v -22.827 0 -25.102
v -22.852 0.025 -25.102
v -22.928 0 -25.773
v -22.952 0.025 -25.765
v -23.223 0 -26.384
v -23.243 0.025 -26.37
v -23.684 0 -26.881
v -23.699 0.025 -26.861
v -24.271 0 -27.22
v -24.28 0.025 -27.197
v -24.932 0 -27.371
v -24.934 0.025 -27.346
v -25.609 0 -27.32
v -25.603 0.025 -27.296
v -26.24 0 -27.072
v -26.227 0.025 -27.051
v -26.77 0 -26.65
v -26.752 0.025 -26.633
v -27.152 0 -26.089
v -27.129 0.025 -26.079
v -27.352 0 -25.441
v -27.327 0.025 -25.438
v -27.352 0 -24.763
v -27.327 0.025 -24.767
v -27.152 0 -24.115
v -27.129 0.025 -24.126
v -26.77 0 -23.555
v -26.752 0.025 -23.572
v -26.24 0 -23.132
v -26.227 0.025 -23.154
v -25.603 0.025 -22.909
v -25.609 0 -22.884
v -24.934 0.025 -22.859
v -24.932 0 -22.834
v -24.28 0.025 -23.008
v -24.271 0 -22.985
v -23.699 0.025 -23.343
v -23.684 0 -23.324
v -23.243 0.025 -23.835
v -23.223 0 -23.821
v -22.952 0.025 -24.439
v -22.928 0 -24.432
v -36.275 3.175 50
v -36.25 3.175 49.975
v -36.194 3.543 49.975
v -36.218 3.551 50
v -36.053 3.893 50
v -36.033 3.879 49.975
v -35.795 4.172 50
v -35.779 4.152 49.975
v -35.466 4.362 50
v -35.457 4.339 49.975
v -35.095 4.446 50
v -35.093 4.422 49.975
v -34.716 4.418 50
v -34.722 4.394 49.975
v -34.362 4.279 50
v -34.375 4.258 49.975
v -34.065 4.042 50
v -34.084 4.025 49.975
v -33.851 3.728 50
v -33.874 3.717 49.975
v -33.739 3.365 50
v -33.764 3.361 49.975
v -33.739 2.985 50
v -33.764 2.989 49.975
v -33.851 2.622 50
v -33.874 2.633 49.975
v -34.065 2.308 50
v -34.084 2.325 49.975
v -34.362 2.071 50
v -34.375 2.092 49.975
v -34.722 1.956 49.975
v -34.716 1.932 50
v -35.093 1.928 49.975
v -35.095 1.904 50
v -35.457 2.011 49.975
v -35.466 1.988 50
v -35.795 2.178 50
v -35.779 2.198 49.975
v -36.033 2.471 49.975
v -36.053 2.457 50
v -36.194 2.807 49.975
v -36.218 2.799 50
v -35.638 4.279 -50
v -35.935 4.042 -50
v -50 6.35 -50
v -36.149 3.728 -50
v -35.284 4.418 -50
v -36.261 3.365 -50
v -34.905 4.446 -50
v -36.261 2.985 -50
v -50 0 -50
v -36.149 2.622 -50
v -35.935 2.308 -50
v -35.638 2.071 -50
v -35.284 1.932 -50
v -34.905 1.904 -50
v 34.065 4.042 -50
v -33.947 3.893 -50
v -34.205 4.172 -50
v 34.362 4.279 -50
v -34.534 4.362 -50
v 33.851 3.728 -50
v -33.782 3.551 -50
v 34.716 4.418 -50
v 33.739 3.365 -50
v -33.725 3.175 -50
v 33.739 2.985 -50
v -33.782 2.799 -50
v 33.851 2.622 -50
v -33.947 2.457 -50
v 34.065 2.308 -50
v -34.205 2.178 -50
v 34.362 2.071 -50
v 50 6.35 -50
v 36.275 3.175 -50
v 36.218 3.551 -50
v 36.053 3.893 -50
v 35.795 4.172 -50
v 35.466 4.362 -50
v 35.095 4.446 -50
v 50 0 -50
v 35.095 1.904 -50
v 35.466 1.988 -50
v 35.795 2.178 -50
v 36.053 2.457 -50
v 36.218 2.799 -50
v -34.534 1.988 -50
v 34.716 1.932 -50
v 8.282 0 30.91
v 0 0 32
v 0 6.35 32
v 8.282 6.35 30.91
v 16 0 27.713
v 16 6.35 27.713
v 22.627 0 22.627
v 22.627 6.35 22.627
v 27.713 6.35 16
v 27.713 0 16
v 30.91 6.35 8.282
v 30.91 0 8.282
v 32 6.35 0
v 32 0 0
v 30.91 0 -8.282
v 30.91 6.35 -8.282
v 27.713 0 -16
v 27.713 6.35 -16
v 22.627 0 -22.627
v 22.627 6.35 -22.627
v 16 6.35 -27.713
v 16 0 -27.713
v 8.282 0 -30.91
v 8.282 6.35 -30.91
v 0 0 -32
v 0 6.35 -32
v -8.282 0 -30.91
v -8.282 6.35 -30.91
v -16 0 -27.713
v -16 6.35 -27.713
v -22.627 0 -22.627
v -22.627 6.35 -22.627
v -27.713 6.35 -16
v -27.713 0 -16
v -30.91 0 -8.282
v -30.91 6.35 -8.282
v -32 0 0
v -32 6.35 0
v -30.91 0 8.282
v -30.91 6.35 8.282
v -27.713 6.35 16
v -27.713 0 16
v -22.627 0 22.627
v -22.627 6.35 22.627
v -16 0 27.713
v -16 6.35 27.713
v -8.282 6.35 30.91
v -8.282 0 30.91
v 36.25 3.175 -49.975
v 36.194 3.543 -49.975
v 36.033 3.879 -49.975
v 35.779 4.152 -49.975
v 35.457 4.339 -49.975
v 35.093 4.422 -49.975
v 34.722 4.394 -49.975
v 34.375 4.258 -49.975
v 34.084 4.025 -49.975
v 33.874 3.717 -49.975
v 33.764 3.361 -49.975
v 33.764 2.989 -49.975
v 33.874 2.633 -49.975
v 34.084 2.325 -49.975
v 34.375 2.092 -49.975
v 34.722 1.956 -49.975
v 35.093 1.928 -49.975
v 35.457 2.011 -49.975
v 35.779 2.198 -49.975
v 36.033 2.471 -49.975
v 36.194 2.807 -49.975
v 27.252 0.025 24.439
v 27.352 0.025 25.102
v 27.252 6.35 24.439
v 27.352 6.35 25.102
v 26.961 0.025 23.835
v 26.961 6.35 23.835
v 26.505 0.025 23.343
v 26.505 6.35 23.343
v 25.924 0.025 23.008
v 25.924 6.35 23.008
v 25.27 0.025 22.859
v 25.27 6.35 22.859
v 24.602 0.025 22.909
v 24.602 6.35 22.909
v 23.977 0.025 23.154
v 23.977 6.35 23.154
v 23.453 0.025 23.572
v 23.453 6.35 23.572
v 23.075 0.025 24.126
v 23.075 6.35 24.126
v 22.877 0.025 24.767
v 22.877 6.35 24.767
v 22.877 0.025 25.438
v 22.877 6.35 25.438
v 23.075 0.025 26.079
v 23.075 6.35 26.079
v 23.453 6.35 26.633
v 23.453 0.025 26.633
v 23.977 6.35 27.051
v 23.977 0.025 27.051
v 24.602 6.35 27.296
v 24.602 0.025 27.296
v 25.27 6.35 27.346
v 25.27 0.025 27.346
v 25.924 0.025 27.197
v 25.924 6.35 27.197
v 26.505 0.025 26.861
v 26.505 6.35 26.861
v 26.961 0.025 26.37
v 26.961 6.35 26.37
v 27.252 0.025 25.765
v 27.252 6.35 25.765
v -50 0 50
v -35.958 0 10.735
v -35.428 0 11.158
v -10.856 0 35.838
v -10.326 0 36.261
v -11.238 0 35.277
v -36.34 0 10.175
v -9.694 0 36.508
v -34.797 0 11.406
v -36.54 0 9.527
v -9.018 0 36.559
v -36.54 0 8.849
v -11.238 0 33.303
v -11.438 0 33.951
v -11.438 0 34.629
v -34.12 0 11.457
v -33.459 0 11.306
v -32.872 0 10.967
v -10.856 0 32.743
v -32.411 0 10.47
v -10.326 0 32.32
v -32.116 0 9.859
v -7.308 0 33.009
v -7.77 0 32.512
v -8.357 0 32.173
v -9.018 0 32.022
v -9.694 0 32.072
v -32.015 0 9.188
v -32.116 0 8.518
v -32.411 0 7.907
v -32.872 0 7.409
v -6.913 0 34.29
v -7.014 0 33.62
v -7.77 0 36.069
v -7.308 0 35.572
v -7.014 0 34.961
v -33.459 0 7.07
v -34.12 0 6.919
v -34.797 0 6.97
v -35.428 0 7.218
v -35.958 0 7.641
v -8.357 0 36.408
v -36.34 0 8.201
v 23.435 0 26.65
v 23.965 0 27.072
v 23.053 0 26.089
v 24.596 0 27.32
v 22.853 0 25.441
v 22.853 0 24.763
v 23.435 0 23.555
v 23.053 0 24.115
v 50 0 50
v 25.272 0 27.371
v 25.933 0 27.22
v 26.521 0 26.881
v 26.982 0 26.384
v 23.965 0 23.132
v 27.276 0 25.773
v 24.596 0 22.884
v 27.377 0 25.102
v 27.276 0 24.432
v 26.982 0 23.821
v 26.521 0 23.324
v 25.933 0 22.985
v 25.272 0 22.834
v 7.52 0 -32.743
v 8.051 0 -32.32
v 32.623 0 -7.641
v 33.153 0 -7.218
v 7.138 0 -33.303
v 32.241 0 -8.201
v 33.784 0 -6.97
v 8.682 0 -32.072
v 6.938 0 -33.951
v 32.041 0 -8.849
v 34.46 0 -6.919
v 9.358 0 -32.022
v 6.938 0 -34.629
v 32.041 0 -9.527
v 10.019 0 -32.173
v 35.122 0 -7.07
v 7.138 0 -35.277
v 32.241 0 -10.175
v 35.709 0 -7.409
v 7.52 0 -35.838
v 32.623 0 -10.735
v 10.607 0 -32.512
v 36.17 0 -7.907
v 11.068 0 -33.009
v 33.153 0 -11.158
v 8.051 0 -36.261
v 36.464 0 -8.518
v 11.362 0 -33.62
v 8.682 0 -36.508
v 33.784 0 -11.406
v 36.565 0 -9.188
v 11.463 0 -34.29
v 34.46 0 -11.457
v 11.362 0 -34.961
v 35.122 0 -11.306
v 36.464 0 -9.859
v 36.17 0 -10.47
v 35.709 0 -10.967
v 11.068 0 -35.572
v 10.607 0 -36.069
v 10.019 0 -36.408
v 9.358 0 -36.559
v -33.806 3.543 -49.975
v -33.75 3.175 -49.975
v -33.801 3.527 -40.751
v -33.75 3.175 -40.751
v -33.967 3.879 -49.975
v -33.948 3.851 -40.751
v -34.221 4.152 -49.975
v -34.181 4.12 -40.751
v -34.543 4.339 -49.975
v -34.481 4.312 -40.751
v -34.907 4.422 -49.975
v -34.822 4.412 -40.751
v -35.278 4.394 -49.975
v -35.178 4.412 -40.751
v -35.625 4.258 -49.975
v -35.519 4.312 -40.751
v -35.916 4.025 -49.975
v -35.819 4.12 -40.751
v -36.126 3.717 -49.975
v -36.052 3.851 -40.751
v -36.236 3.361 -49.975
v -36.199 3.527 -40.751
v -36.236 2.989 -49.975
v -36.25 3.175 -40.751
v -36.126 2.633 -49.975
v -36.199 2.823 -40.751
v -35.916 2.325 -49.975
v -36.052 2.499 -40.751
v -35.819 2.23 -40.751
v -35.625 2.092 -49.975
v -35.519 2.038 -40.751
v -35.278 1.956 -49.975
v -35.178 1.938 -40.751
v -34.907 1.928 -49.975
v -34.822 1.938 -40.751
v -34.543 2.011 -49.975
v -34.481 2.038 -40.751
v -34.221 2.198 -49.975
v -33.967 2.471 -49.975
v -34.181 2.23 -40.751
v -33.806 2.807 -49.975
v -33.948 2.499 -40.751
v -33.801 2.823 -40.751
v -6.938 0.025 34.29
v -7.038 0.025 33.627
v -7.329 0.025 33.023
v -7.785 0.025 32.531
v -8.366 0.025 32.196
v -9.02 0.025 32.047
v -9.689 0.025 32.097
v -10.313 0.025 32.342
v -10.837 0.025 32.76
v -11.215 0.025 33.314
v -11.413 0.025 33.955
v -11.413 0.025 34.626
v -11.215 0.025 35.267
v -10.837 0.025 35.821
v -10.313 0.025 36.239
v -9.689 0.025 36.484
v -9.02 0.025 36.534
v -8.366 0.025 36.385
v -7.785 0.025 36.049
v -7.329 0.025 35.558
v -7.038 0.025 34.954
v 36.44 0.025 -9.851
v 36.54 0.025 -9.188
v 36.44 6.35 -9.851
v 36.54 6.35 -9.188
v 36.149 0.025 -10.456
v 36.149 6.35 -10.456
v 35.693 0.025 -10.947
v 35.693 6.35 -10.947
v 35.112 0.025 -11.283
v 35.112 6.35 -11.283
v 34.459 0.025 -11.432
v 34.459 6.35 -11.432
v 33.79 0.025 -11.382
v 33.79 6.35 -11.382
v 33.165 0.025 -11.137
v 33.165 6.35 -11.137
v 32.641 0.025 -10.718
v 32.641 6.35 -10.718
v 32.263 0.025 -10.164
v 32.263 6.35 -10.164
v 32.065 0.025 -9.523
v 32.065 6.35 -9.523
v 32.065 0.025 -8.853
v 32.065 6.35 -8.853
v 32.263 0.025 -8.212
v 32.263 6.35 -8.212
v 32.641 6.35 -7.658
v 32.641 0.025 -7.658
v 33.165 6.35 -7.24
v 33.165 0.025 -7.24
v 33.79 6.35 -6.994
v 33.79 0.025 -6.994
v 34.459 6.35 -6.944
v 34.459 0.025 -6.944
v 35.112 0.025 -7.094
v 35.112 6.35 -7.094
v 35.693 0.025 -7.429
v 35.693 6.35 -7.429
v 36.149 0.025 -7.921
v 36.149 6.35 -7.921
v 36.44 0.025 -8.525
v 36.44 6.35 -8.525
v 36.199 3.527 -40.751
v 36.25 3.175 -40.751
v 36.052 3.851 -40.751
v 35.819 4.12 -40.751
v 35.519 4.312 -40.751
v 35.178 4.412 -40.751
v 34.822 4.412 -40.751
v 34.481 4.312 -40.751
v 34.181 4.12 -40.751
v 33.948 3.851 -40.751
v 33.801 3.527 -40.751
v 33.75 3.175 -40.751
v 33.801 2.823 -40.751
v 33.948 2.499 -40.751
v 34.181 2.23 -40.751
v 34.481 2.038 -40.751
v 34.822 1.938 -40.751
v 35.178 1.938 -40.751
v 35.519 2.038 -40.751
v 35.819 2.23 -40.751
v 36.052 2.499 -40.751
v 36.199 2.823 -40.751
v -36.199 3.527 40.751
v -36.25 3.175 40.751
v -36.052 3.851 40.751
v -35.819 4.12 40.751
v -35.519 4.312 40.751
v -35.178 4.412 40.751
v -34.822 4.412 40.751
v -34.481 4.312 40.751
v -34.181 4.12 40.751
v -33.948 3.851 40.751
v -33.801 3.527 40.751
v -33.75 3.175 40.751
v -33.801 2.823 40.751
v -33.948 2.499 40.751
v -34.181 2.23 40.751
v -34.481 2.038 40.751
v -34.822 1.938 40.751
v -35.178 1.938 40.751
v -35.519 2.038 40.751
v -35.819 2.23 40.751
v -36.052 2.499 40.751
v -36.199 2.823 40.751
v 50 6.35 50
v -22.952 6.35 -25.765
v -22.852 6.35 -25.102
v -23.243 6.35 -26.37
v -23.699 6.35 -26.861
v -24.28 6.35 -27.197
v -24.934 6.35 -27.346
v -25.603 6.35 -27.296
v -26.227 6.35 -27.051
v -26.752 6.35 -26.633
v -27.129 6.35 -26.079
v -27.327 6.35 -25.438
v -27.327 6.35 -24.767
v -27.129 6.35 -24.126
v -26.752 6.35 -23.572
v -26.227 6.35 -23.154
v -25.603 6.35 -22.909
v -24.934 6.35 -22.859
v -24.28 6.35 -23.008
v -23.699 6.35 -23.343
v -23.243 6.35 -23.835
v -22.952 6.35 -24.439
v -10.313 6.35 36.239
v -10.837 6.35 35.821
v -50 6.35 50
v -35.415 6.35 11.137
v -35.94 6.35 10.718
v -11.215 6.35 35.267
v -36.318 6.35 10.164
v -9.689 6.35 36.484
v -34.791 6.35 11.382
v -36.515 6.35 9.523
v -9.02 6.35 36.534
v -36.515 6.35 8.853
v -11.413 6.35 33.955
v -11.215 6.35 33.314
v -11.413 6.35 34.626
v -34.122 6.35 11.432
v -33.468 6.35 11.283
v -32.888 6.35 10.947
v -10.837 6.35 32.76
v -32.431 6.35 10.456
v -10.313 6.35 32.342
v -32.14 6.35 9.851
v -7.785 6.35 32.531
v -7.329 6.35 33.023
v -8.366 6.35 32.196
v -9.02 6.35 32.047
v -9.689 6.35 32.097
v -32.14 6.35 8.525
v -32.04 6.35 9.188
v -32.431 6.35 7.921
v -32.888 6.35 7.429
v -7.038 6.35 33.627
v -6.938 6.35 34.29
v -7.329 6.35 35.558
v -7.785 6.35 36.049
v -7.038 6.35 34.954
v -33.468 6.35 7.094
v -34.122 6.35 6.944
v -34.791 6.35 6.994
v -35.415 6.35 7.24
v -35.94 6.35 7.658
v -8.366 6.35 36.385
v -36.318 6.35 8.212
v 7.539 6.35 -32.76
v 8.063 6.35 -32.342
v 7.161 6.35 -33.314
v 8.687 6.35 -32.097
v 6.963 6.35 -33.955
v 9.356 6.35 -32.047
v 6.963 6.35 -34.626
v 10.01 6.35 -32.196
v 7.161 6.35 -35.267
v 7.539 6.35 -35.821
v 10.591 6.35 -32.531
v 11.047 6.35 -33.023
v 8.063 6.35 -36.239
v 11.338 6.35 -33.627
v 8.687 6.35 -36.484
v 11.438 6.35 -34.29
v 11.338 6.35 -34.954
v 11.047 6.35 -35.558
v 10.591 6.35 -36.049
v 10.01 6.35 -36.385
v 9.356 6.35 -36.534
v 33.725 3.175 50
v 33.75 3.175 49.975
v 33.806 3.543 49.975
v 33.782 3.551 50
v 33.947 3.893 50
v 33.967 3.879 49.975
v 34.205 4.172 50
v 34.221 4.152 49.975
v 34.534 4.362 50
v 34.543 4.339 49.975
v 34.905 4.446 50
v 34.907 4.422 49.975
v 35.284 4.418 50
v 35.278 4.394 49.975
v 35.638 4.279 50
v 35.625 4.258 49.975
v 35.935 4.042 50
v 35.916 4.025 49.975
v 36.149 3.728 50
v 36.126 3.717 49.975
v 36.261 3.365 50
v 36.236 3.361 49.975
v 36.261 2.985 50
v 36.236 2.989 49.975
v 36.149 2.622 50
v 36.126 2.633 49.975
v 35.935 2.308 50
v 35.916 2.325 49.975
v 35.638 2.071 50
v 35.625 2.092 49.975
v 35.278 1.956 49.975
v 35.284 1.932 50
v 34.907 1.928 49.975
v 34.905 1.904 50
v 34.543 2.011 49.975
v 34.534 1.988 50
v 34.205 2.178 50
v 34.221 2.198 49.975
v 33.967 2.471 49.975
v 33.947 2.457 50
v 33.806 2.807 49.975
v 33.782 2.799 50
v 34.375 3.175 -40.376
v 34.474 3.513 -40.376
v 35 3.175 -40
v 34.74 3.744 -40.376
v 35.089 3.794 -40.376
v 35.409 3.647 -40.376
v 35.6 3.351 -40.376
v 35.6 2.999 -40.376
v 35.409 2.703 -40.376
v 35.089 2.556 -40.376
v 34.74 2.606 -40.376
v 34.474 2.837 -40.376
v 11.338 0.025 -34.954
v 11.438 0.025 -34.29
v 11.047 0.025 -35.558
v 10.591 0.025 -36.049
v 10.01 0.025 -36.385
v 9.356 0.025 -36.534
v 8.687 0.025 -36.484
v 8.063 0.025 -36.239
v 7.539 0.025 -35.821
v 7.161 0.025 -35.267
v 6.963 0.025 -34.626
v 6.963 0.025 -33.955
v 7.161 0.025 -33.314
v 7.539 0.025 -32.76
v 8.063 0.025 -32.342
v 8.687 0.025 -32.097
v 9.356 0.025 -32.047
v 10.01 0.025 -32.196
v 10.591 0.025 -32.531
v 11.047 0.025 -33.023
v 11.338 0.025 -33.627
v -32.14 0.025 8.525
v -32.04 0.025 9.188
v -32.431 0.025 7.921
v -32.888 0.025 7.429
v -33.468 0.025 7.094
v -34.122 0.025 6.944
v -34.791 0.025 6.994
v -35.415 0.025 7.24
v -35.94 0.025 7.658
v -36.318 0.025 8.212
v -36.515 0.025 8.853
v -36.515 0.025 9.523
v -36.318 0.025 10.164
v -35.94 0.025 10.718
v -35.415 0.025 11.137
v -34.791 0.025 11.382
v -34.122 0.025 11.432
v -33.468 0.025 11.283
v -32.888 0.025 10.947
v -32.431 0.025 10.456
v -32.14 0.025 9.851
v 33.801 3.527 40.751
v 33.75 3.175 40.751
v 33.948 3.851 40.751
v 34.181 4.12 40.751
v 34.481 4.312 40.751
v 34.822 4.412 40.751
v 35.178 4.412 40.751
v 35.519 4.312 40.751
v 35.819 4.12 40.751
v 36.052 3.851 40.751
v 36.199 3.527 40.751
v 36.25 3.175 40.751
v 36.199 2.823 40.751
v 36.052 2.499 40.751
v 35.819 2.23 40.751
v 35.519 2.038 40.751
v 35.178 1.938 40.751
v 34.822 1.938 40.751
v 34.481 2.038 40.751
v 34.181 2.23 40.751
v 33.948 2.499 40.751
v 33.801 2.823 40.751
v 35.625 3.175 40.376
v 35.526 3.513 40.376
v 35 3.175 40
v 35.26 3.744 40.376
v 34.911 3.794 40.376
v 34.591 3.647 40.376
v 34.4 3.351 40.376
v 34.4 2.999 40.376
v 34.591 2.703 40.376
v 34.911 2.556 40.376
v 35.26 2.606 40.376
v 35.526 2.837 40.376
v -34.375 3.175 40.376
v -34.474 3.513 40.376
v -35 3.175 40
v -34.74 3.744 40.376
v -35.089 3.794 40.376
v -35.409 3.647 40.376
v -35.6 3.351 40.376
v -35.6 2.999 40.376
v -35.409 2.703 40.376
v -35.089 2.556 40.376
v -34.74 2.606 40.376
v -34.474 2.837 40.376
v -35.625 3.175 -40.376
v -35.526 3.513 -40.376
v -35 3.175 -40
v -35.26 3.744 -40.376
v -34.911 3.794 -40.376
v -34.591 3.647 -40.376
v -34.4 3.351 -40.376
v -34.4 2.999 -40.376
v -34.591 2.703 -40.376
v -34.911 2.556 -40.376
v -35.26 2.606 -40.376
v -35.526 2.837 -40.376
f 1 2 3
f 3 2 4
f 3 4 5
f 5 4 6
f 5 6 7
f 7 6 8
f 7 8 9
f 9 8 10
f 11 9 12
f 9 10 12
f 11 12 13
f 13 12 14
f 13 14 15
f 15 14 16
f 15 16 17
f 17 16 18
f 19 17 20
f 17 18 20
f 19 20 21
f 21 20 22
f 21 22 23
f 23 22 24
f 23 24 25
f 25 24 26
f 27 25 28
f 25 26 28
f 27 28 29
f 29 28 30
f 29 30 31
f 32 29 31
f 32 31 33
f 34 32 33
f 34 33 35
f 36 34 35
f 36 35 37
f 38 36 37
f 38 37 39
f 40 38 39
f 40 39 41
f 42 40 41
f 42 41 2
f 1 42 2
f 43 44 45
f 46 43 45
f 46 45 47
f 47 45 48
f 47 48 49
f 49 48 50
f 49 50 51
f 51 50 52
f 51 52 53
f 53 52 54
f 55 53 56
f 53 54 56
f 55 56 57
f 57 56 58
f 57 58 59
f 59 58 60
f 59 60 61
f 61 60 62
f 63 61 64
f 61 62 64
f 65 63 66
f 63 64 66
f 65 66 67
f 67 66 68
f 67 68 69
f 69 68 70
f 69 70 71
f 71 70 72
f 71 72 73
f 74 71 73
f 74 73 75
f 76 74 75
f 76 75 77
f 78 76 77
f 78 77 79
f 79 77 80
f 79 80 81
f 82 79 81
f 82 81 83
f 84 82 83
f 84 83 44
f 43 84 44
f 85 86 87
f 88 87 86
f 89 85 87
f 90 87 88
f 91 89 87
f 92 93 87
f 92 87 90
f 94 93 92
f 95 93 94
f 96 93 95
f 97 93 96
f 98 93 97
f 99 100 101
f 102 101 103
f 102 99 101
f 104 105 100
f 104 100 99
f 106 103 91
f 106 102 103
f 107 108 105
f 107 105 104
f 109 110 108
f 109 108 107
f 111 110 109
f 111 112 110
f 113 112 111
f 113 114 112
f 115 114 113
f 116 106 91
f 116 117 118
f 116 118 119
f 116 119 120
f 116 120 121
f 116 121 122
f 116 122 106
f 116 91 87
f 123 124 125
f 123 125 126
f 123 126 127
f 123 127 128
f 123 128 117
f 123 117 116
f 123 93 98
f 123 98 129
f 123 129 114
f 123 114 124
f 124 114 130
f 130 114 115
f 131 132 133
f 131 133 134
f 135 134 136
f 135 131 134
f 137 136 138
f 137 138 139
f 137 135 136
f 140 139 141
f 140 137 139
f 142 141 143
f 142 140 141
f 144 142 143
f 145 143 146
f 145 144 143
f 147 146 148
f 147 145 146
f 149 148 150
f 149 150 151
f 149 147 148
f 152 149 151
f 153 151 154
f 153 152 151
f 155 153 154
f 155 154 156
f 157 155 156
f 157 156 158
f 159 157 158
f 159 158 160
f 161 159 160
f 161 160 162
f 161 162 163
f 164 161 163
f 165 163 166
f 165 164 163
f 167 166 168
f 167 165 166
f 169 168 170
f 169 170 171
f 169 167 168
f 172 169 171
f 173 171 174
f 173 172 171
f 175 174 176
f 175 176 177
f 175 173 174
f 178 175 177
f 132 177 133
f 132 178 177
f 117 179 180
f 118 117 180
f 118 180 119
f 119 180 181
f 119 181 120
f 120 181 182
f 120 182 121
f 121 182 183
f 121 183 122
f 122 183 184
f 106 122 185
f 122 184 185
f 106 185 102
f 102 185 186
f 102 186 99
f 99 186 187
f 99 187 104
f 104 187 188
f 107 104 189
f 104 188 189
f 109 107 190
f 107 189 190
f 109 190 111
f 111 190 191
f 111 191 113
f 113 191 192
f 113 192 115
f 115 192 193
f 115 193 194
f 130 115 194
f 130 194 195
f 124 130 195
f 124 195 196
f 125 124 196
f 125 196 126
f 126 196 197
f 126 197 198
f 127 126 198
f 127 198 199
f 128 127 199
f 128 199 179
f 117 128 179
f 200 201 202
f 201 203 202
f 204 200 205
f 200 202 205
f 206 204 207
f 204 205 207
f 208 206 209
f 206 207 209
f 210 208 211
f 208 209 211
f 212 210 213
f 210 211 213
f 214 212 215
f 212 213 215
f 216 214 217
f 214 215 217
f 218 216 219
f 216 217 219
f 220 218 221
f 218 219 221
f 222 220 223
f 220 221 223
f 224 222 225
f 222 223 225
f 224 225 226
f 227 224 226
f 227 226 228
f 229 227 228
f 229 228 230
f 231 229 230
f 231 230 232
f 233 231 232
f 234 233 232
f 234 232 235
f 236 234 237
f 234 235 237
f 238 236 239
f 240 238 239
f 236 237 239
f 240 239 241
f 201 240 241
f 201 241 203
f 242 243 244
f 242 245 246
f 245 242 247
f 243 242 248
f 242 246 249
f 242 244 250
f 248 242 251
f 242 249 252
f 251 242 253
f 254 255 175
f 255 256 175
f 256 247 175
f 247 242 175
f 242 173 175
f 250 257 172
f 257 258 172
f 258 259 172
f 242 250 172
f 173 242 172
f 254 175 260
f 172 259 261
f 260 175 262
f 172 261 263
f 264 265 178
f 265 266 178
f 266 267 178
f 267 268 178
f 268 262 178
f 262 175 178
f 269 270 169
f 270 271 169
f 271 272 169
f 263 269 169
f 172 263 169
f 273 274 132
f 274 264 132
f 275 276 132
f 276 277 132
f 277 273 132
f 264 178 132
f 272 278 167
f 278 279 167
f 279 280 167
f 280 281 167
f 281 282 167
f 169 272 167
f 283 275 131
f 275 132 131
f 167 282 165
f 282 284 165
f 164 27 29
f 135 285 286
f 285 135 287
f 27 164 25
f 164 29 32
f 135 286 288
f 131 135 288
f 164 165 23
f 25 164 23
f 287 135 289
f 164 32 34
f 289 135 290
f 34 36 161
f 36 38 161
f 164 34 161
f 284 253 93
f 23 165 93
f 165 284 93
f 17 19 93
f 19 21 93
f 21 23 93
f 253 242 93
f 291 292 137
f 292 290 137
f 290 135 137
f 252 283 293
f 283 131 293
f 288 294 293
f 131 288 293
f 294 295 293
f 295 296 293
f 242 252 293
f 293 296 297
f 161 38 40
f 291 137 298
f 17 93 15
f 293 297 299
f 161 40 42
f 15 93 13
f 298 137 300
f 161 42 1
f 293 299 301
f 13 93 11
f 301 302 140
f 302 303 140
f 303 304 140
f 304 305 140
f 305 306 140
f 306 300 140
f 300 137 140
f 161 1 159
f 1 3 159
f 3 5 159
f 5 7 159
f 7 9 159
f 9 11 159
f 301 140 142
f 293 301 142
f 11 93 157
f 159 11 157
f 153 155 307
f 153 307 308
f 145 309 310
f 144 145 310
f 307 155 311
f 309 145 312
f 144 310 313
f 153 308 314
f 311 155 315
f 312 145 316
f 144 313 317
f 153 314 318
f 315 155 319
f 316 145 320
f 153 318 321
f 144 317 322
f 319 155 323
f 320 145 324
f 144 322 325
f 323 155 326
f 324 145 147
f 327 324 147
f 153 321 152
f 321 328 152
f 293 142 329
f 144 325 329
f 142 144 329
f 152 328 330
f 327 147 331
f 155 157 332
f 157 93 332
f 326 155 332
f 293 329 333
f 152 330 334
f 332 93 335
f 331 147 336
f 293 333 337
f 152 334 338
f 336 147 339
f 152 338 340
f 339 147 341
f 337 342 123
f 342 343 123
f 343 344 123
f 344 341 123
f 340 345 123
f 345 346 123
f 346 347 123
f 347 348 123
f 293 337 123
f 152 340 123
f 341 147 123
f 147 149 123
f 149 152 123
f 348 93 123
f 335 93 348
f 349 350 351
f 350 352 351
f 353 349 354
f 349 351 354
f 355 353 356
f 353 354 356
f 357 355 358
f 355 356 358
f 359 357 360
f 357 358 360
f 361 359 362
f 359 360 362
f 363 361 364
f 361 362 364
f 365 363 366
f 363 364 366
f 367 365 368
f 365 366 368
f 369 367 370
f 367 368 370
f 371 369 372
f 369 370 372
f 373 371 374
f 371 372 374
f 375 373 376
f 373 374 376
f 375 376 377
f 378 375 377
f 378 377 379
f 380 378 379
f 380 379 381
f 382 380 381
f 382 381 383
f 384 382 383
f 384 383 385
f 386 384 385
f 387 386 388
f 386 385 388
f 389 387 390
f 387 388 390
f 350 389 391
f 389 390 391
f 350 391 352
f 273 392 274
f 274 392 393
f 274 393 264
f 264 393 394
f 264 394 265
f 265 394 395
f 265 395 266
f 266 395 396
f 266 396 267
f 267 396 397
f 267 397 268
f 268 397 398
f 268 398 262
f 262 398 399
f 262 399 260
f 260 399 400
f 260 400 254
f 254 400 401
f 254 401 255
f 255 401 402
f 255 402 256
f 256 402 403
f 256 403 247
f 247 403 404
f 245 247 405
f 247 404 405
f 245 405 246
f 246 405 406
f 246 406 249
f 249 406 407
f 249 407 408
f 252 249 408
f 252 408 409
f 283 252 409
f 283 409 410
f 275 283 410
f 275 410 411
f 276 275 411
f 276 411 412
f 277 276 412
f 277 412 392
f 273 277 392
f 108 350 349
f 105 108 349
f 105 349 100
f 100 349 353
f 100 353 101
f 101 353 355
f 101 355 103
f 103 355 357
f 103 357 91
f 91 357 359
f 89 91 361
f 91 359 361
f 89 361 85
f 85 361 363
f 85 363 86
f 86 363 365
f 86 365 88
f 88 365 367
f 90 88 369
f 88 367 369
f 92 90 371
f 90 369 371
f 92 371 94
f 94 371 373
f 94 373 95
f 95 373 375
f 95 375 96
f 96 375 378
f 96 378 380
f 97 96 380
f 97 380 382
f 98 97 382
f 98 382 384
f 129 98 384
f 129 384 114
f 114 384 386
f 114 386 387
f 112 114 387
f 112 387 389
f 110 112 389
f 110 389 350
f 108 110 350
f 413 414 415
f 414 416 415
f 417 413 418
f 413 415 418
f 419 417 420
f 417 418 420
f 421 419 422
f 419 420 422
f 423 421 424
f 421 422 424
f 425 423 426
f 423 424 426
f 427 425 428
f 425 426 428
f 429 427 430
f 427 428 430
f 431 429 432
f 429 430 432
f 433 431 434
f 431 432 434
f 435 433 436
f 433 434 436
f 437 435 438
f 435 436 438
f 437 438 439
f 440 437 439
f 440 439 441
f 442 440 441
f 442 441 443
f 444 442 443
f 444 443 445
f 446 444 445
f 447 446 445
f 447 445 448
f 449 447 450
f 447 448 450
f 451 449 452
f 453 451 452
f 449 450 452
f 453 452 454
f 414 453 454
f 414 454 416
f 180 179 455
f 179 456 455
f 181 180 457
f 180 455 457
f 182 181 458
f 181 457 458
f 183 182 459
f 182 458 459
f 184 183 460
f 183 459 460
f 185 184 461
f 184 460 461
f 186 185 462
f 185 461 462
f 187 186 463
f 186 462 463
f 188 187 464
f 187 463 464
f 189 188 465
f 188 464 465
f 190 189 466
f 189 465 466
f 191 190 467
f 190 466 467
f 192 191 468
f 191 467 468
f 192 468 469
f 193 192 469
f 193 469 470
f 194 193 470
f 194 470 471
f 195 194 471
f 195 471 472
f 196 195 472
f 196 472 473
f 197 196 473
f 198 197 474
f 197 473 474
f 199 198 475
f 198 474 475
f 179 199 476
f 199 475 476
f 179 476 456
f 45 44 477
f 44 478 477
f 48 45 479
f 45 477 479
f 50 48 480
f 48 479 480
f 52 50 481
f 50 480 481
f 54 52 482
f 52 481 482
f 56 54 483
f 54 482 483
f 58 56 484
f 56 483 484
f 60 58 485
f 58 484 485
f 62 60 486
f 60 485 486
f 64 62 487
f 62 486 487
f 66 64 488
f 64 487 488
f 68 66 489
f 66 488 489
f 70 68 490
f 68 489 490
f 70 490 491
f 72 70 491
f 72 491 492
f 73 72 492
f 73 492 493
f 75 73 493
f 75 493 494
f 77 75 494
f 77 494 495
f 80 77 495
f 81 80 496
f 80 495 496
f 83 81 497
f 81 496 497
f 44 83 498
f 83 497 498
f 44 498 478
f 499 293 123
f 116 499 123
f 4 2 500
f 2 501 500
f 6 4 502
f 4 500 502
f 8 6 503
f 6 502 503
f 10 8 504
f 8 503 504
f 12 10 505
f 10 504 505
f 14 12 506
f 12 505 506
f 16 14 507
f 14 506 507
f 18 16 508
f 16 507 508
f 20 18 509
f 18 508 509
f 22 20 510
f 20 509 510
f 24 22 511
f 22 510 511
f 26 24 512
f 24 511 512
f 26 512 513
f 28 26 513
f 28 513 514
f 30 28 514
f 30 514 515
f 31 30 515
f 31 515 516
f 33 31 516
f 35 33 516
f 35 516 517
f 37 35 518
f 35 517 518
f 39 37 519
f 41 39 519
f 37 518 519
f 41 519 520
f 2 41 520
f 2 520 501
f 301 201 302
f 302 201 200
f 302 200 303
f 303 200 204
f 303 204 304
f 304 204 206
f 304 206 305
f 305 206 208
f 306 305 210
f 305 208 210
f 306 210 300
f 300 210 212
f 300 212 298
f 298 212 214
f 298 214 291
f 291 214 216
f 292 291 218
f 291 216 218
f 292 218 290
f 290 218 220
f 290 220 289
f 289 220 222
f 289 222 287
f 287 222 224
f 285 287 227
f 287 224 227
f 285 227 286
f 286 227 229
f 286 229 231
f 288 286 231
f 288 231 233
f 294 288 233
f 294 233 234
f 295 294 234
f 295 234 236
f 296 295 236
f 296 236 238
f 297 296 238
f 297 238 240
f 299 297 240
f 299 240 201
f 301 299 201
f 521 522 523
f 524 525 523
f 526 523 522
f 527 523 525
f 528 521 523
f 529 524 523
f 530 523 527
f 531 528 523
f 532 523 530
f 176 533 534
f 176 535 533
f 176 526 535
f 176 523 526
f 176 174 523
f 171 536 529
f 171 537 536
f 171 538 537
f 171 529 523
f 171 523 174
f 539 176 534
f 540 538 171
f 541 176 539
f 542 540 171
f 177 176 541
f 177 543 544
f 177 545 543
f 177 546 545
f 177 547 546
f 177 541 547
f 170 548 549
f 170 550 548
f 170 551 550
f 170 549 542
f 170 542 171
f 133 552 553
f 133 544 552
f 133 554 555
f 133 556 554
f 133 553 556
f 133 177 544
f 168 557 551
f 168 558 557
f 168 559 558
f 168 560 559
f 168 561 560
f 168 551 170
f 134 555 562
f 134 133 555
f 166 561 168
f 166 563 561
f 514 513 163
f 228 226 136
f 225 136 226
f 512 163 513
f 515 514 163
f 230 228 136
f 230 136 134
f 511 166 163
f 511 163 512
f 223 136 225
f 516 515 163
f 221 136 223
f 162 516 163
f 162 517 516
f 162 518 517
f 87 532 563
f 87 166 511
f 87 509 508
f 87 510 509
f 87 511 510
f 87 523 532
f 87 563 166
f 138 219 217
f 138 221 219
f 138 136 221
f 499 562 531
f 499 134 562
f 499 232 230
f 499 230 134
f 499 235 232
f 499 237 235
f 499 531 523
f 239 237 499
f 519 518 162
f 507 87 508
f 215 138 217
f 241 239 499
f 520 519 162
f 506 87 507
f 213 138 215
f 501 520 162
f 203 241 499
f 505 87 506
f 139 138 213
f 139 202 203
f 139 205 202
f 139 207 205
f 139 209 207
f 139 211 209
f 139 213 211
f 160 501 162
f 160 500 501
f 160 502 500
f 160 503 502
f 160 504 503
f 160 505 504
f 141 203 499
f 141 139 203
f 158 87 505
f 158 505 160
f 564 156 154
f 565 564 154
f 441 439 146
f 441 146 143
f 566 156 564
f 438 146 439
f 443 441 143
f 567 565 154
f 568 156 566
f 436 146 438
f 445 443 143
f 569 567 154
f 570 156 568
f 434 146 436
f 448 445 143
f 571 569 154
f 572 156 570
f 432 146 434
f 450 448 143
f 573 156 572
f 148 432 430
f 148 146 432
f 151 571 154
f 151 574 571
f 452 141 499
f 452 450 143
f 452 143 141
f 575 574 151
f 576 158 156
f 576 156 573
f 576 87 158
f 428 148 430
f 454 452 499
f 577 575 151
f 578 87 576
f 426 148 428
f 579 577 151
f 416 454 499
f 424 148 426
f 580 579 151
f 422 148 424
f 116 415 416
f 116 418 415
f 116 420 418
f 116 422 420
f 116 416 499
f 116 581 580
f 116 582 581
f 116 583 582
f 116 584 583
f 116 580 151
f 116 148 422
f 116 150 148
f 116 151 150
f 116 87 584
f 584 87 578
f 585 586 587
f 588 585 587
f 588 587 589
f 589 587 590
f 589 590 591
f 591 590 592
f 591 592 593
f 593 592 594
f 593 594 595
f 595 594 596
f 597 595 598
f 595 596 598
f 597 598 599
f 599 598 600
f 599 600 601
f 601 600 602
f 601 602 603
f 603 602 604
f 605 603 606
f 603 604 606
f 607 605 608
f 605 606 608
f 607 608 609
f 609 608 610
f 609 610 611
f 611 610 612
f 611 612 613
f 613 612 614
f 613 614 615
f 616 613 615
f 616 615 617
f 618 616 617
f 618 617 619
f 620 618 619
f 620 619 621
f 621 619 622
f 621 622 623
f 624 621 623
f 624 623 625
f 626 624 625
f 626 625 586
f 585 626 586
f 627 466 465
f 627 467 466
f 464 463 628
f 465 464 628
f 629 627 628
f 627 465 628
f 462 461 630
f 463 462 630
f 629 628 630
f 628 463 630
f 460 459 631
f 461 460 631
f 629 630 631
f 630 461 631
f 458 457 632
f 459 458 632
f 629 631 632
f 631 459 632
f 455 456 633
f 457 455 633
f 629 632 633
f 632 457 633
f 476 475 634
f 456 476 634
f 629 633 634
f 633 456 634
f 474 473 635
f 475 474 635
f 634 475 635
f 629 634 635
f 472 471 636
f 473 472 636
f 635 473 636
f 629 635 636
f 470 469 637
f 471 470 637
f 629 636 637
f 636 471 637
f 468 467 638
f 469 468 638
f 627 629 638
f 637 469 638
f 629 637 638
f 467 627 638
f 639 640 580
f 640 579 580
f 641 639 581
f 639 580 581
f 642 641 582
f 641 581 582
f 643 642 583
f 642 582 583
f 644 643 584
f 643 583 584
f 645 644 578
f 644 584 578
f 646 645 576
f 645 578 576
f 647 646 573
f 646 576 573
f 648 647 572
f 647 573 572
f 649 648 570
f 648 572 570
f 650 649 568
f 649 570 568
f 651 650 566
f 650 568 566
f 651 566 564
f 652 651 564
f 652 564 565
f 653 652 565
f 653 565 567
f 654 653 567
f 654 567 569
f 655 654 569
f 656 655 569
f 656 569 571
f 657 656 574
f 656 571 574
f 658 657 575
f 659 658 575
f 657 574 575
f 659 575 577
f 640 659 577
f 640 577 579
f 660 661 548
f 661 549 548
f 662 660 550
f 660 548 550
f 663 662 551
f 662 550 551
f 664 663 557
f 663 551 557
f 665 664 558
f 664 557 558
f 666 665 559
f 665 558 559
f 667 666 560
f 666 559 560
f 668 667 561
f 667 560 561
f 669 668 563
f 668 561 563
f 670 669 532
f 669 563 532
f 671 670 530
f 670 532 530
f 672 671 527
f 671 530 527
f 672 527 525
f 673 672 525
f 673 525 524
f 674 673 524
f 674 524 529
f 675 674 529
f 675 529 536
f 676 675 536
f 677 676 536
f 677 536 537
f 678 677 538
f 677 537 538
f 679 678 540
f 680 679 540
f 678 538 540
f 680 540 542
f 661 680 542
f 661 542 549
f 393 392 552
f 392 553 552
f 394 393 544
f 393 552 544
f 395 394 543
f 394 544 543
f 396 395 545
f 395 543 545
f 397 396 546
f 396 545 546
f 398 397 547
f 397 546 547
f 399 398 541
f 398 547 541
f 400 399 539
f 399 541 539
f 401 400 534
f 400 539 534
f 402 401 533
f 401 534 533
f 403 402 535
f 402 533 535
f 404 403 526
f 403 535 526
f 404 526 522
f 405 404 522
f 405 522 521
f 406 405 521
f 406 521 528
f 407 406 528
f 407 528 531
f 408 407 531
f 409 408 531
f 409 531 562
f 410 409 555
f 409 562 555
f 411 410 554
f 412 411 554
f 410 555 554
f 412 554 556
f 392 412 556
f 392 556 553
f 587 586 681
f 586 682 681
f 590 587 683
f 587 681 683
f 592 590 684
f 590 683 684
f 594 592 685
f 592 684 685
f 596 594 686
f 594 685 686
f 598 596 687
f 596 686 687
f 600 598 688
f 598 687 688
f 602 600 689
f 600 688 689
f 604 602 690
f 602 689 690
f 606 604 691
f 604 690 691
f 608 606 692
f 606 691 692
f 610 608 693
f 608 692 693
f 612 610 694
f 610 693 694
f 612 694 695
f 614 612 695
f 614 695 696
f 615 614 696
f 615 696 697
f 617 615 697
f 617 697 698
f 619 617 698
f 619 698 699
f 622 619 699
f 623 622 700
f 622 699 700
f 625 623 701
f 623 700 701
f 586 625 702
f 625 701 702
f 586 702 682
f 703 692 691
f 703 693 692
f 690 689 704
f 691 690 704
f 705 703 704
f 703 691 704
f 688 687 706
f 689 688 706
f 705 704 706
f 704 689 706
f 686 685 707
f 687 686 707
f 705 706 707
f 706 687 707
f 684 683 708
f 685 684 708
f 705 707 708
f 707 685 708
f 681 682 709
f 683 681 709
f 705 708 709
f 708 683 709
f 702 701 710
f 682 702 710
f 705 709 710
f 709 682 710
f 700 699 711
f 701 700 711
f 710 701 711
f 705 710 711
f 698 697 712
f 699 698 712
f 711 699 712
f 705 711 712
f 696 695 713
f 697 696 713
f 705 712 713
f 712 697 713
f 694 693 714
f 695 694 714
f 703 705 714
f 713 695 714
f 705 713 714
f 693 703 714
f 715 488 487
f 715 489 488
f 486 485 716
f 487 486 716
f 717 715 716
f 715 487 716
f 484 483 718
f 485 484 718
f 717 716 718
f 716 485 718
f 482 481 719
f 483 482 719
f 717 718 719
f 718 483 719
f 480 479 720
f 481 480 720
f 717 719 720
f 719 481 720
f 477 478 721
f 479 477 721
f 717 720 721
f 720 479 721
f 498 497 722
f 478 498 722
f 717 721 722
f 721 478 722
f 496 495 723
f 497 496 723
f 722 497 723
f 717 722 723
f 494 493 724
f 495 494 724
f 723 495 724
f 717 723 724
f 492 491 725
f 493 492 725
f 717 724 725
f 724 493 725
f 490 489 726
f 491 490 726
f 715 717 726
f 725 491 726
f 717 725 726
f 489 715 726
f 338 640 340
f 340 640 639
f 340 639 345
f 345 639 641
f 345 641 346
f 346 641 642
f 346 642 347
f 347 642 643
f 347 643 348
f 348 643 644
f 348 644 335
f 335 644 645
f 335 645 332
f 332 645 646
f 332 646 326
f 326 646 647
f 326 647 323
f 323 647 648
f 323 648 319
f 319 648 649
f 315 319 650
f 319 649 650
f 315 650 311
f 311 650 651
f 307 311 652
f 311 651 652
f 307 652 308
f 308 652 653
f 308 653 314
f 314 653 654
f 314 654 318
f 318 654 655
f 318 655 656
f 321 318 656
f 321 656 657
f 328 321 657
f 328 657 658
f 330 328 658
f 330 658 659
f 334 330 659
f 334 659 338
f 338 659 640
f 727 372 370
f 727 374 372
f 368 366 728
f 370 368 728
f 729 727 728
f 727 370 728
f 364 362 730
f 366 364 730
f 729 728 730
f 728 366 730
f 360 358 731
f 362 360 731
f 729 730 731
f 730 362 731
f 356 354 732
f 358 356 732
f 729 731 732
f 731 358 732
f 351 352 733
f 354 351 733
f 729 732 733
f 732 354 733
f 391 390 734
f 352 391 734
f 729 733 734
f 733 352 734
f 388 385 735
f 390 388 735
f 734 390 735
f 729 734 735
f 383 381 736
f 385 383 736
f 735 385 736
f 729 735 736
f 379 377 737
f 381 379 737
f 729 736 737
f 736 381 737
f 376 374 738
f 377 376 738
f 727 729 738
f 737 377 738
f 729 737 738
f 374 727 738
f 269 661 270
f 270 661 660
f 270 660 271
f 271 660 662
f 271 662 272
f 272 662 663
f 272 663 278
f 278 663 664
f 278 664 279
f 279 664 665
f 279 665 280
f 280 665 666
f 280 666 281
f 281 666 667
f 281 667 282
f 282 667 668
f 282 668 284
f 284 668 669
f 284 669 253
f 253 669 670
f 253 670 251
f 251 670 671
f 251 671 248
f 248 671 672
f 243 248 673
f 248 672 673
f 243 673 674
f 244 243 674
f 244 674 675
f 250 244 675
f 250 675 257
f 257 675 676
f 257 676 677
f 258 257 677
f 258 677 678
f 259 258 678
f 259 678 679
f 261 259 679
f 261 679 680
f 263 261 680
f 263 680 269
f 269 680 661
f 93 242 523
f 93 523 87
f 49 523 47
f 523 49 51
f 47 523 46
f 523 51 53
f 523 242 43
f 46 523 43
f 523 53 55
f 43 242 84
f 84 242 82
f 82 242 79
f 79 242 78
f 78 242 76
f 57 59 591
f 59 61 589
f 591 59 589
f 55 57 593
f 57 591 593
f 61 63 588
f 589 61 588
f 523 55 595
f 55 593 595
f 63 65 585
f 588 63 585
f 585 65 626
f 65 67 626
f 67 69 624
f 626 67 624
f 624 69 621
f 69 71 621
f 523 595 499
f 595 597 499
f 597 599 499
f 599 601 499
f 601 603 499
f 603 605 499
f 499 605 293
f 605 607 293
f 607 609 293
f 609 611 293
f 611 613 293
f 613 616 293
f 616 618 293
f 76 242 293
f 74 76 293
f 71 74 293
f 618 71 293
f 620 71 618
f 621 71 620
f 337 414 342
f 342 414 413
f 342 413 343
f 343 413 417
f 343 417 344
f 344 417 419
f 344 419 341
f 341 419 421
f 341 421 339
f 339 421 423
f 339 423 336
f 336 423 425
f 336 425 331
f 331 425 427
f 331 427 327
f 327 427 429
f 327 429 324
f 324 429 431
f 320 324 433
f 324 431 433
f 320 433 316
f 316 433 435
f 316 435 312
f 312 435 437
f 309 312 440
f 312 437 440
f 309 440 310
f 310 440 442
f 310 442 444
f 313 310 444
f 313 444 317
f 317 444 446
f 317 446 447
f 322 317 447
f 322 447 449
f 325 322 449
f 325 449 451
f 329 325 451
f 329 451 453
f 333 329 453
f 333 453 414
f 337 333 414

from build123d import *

# Parameters (mm, degrees)
SKETCH1_W                             = 100
SKETCH1_H                             = 100
SKETCH1_R                             = 32
BOSS_EXTRUDE3_DEPTH                   = 6.35
M4_CLEARANCE_HOLE2_D                  = 4.5
M4_CLEARANCE_HOLE2_CSINK_D            = 4.55
M4_CLEARANCE_HOLE2_CSINK_ANGLE        = 90
TAP_DRILL_FOR_M3X0_5_TAP2_D           = 2.5
TAP_DRILL_FOR_M3X0_5_TAP2_DEPTH       = 9.248924226
TAP_DRILL_FOR_M3X0_5_TAP2_CSINK_D     = 2.55
TAP_DRILL_FOR_M3X0_5_TAP2_CSINK_ANGLE = 90
TAP_DRILL_FOR_M3X0_5_TAP2_TIP         = 0.751075774
TAP_DRILL_FOR_M3X0_5_TAP3_D           = 2.5
TAP_DRILL_FOR_M3X0_5_TAP3_DEPTH       = 9.248924226
TAP_DRILL_FOR_M3X0_5_TAP3_CSINK_D     = 2.55
TAP_DRILL_FOR_M3X0_5_TAP3_CSINK_ANGLE = 90
TAP_DRILL_FOR_M3X0_5_TAP3_TIP         = 0.751075774


with BuildPart() as part:
    # Sketch1 → Boss-Extrude3 (new body)
    with BuildSketch(Plane(origin=(0, 0, 0), x_dir=(1, 0, 0), z_dir=(0, 1, 0))):
        Rectangle(SKETCH1_W, SKETCH1_H)
        with Locations(Location((0, 0, 0), (0, 0, 270))):
            Circle(SKETCH1_R, mode=Mode.SUBTRACT)
    extrude(amount=BOSS_EXTRUDE3_DEPTH)

    # M4 Clearance Hole2 (through all)
    with Locations(Plane(origin=(0, 0, 0), x_dir=(-1, 0, 0), z_dir=(0, -1, 0))):
        with Locations((-9.188076101, 34.290366833), (25.102290732, 25.102290732), (34.290366833, -9.188076101), (9.188076101, -34.290366833), (-25.102290732, -25.102290732), (-34.290366833, 9.188076101)):
            CounterSinkHole(M4_CLEARANCE_HOLE2_D / 2, M4_CLEARANCE_HOLE2_CSINK_D / 2, counter_sink_angle=M4_CLEARANCE_HOLE2_CSINK_ANGLE)

    # Tap Drill for M3x0.5 Tap2
    with Locations(Plane.XY.offset(50)):
        with Locations((-35, 3.175), (35, 3.175)):
            CounterSinkHole(TAP_DRILL_FOR_M3X0_5_TAP2_D / 2, TAP_DRILL_FOR_M3X0_5_TAP2_CSINK_D / 2, depth=TAP_DRILL_FOR_M3X0_5_TAP2_DEPTH, counter_sink_angle=TAP_DRILL_FOR_M3X0_5_TAP2_CSINK_ANGLE)
            with Locations((0, 0, -(TAP_DRILL_FOR_M3X0_5_TAP2_DEPTH + TAP_DRILL_FOR_M3X0_5_TAP2_TIP / 2))):  # 118° drill point
                Cone(0, TAP_DRILL_FOR_M3X0_5_TAP2_D / 2, TAP_DRILL_FOR_M3X0_5_TAP2_TIP, mode=Mode.SUBTRACT)

    # Tap Drill for M3x0.5 Tap3
    with Locations(Plane(origin=(0, 0, -50), x_dir=(-1, 0, 0), z_dir=(0, 0, -1))):
        with Locations((-35, 3.175), (35, 3.175)):
            CounterSinkHole(TAP_DRILL_FOR_M3X0_5_TAP3_D / 2, TAP_DRILL_FOR_M3X0_5_TAP3_CSINK_D / 2, depth=TAP_DRILL_FOR_M3X0_5_TAP3_DEPTH, counter_sink_angle=TAP_DRILL_FOR_M3X0_5_TAP3_CSINK_ANGLE)
            with Locations((0, 0, -(TAP_DRILL_FOR_M3X0_5_TAP3_DEPTH + TAP_DRILL_FOR_M3X0_5_TAP3_TIP / 2))):  # 118° drill point
                Cone(0, TAP_DRILL_FOR_M3X0_5_TAP3_D / 2, TAP_DRILL_FOR_M3X0_5_TAP3_TIP, mode=Mode.SUBTRACT)


solid = part.part
